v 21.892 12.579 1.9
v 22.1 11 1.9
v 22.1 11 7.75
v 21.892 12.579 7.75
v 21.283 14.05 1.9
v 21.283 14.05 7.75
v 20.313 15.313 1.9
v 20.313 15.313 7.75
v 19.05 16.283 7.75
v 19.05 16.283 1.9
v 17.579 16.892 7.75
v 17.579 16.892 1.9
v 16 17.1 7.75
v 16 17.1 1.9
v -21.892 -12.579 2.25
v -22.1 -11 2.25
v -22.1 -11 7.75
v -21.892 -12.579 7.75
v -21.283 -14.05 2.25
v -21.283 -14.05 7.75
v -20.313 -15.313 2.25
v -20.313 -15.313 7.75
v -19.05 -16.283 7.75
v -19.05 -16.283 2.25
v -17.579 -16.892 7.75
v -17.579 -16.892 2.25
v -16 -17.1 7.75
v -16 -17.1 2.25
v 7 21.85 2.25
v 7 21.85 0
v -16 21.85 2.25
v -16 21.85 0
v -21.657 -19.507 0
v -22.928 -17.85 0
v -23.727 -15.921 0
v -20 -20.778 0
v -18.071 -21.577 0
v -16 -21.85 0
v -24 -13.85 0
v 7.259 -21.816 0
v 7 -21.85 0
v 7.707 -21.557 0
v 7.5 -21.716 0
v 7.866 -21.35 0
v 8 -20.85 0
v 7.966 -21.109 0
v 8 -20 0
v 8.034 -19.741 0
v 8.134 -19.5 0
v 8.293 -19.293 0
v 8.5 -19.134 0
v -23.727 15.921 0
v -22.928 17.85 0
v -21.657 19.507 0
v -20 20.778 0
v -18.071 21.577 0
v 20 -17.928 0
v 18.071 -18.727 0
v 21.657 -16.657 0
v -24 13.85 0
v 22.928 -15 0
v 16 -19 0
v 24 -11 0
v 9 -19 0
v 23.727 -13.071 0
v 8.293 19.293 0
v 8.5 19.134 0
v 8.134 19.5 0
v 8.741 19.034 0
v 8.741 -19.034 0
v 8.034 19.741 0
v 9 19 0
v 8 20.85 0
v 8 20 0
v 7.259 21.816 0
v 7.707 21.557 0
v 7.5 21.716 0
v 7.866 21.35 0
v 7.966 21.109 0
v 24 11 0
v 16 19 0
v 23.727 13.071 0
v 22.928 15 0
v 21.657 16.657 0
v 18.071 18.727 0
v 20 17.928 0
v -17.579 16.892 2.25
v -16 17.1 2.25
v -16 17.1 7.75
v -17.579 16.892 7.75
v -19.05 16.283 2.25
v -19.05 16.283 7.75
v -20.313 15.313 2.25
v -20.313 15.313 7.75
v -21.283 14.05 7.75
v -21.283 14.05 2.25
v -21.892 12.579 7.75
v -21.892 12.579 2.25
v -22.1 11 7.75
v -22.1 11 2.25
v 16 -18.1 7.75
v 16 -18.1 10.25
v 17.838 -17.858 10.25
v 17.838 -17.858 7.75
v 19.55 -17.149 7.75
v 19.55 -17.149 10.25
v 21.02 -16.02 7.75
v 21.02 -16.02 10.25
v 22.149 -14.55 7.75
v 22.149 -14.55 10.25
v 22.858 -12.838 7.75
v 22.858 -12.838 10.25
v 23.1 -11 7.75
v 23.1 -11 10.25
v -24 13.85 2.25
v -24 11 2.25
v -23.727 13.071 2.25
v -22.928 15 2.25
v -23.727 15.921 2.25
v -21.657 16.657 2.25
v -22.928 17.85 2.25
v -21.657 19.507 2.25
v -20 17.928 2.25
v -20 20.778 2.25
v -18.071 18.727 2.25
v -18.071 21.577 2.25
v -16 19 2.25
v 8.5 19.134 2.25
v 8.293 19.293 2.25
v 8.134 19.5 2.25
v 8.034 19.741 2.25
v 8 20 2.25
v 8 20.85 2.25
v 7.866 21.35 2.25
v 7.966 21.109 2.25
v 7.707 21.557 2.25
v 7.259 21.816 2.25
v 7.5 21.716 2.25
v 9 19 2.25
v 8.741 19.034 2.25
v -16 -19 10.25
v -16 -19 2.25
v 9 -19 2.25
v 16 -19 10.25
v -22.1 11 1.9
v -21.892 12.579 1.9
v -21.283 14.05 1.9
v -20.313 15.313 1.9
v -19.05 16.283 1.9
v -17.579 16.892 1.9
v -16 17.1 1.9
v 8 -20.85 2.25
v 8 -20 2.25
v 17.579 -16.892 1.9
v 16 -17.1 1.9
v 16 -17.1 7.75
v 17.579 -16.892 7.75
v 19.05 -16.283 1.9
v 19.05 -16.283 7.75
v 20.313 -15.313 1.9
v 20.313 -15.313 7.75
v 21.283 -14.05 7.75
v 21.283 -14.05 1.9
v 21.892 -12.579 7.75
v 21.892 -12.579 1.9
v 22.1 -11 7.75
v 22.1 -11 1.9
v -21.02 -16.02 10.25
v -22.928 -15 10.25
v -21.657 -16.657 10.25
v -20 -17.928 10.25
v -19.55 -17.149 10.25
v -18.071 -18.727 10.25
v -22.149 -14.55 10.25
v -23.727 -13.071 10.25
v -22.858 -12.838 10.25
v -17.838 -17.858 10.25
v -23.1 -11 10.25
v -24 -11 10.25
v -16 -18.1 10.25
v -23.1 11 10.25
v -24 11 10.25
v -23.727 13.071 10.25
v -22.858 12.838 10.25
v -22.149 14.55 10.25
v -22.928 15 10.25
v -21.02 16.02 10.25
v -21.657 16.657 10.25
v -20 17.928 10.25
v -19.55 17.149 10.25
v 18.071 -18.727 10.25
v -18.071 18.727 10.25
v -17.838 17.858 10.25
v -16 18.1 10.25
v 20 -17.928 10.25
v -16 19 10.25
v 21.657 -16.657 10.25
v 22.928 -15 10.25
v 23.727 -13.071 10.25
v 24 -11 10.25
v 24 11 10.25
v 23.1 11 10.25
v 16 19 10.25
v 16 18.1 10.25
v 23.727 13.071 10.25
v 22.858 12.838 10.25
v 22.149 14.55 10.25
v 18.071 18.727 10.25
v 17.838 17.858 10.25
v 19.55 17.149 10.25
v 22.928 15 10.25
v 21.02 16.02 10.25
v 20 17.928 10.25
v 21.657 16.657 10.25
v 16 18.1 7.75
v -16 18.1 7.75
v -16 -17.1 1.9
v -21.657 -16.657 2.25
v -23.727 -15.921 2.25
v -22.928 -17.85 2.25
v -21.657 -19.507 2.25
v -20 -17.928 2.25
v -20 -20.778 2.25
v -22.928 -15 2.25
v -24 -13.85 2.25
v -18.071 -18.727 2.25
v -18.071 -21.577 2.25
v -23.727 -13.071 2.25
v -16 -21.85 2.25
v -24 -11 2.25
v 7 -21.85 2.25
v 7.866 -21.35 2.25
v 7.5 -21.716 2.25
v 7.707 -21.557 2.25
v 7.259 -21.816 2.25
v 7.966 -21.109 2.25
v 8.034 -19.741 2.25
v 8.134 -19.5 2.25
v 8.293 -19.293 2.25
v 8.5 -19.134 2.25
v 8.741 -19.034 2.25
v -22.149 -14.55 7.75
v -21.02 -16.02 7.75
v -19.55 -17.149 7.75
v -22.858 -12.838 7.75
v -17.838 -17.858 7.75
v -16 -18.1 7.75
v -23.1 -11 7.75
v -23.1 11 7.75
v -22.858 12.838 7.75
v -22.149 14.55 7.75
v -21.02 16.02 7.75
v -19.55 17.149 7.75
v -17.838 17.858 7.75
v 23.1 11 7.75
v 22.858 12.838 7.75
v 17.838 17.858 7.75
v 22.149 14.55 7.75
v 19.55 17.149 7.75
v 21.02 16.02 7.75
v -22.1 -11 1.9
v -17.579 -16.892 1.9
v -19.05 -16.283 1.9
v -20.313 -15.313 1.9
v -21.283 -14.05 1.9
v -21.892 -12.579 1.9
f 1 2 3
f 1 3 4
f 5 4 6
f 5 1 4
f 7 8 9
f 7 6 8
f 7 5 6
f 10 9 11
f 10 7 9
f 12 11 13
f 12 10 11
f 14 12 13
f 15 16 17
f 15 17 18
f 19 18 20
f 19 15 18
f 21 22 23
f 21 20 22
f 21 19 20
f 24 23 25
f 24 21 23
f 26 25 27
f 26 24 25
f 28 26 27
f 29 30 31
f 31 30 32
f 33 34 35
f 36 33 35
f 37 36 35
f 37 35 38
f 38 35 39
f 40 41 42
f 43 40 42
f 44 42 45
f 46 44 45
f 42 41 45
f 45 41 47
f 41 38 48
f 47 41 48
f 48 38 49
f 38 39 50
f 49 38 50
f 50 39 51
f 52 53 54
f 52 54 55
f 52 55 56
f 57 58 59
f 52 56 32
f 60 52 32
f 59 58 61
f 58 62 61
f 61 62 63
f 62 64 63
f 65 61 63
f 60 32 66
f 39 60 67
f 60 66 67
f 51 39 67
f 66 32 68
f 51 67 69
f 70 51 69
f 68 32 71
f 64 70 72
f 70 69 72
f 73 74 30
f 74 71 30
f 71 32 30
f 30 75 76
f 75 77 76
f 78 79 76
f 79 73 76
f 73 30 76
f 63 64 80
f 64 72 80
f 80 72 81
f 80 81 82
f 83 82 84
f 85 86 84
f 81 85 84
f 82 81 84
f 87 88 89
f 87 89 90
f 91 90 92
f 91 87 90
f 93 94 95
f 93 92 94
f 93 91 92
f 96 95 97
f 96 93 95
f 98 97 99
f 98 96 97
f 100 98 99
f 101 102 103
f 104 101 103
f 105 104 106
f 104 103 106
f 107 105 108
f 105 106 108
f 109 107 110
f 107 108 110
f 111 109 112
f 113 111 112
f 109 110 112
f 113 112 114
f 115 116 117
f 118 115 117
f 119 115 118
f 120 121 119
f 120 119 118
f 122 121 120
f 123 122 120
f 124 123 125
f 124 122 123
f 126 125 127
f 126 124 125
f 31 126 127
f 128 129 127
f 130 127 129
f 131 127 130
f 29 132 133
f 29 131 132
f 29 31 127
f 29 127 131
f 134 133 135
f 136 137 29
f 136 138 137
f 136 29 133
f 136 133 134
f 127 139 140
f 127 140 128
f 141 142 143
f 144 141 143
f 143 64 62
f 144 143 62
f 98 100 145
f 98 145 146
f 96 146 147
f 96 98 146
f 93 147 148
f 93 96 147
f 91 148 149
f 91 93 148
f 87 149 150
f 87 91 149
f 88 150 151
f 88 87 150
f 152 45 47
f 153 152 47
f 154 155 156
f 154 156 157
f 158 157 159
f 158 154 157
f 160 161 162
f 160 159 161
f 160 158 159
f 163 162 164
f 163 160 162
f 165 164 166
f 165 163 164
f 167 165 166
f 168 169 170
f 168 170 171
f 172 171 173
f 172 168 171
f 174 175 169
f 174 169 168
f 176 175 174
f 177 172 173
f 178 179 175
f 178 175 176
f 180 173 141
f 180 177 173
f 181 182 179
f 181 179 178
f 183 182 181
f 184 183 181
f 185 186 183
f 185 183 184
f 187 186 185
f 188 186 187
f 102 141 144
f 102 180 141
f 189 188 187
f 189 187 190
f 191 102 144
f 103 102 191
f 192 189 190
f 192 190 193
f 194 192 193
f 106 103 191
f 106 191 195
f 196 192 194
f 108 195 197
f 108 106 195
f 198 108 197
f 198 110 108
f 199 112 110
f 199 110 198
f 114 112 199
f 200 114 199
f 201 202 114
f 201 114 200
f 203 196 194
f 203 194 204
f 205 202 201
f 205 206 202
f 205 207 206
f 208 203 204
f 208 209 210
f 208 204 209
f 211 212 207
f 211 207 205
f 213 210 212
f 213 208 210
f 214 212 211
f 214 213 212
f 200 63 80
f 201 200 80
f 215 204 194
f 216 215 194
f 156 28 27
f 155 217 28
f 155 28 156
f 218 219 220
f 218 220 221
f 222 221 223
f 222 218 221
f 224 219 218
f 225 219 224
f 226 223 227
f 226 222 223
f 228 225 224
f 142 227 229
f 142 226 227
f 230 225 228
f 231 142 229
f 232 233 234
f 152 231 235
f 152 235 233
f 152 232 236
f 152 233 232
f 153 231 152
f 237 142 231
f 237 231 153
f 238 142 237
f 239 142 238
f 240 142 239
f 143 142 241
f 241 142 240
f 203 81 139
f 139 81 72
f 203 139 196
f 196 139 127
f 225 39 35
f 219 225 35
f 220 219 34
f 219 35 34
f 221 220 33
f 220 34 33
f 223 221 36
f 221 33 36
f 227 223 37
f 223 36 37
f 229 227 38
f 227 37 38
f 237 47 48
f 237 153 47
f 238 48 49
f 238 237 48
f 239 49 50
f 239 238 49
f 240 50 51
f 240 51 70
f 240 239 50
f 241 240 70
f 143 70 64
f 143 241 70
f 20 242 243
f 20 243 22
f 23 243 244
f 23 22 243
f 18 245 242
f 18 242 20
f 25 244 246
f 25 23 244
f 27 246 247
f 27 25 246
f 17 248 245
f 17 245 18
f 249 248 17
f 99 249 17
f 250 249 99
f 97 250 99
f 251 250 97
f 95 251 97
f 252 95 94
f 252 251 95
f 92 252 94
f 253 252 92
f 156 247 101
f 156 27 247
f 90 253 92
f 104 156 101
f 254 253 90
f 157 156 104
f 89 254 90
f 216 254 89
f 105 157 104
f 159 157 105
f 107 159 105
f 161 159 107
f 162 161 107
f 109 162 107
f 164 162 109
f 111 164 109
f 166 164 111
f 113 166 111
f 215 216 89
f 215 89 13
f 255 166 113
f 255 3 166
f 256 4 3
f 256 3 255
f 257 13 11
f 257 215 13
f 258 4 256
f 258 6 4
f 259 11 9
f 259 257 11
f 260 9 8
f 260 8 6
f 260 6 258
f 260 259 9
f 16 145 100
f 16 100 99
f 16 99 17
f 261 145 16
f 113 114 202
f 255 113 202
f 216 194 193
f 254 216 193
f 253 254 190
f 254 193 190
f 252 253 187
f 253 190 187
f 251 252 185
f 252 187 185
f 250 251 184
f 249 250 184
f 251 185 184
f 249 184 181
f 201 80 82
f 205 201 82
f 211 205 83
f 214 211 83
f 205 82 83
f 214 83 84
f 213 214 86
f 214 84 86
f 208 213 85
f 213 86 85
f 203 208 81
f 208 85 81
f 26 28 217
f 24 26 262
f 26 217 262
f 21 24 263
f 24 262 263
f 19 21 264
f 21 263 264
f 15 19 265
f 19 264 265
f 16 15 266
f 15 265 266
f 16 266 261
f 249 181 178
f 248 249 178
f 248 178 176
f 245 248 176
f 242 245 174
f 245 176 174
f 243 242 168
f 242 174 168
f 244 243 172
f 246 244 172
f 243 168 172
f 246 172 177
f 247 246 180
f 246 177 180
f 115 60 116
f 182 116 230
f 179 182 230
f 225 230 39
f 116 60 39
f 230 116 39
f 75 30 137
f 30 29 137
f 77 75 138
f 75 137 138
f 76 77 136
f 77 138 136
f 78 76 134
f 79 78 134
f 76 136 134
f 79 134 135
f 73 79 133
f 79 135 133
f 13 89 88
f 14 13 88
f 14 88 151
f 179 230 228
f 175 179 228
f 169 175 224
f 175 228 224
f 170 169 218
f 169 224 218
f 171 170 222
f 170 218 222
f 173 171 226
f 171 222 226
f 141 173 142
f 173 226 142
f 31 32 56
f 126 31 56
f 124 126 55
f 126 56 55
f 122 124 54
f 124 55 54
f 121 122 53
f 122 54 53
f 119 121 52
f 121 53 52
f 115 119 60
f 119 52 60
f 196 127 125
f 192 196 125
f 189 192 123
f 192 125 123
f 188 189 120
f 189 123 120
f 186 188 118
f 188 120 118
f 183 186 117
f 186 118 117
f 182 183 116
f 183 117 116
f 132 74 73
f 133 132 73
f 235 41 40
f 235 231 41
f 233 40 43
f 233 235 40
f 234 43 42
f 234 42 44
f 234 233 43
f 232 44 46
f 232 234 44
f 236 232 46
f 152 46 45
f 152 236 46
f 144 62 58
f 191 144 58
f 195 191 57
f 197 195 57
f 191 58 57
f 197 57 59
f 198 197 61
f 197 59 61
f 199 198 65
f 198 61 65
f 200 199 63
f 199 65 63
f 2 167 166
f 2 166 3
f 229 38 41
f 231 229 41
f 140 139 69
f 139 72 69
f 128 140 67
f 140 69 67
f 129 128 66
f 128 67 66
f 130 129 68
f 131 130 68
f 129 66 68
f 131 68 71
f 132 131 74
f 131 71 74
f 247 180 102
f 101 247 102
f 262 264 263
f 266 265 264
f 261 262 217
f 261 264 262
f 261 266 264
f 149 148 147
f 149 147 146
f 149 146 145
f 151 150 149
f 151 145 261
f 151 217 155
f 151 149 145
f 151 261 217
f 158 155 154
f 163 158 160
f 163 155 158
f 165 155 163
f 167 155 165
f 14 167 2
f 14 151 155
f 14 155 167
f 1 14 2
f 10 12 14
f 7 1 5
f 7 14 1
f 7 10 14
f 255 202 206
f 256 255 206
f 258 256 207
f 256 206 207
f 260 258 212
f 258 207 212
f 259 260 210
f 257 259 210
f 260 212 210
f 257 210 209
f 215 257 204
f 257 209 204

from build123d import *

# Parameters (mm, degrees)
F1_DEPTH     = 10.25
F3_DEPTH     = 2.25
F4_R         = 1
F5_T         = 1.9
F5_T3_DEPTH  = 4.8
F5_T5_DEPTH  = 27.8
F5_T8_ANGLE  = 90.000000001
F5_T10_ANGLE = 90.000000001
F7_DEPTH     = 2.5


# Not quite as in the source:
# - a shell that OpenCascade refuses in one call is made with other operations: the cavity is built on its own and cut out


with BuildPart() as f1:
    # F0 (on Top) → F1 (new body)
    with BuildSketch(Plane.XY):
        with BuildLine():
            Line((16, 19), (-16, 19))
            ThreePointArc((-16, 19), (-21.6568542495, 16.6568542495), (-24, 11))
            Line((-24, 11), (-24, -11))
            ThreePointArc((-24, -11), (-21.6568542495, -16.6568542495), (-16, -19))
            Line((-16, -19), (16, -19))
            ThreePointArc((16, -19), (21.6568542495, -16.6568542495), (24, -11))
            Line((24, -11), (24, 11))
            ThreePointArc((24, 11), (21.6568542495, 16.6568542495), (16, 19))
        make_face()
    extrude(amount=F1_DEPTH)

    # F2 (on Top) → F3 (join)
    with BuildSketch(Plane.XY):
        with BuildLine():
            Line((8, 21.85), (-16, 21.85))
            ThreePointArc((-16, 21.85), (-21.6568542495, 19.5068542495), (-24, 13.85))
            Line((-24, 13.85), (-24, -13.85))
            ThreePointArc((-24, -13.85), (-21.6568542495, -19.5068542495), (-16, -21.85))
            Line((-16, -21.85), (8, -21.85))
            Line((8, -21.85), (8, 21.85))
        make_face()
    extrude(amount=F3_DEPTH)

    # F4
    f4_edges = [f1.edges().sort_by_distance(p)[0] for p in [
        (8, 21.85, 1.125),
        (8, 19, 1.125),
        (8, -19, 1.125),
        (8, -21.85, 1.125),
    ]]
    fillet(f4_edges, radius=F4_R)

    # F5: shell of thickness 1.9, made by hand


with BuildPart() as f5_core1:
    # F5_t2: copy of F1
    add(f1.part)

    # the walls: a layer under each face that stays
    f5_faces = [f5_core1.faces().sort_by_distance(p)[0] for p in [
        (0, 19, 5.125),
        (0, 0, 0),
        (8.2928932188, 19.2928932188, 1.125),
        (21.6568542495, 16.6568542495, 5.125),
        (-18.5, 20.0416666667, 2.25),
        (-21.6568542495, 16.6568542495, 6.25),
        (8, 20.425, 1.125),
        (24, 0, 5.125),
        (21.6568542495, -16.6568542495, 5.125),
        (-4.5, 21.85, 1.125),
        (0, -19, 5.125),
        (-21.6568542495, 19.5068542495, 1.125),
        (8.2928932188, -19.2928932188, 1.125),
        (-24, 0, 5.125),
        (8, -20.425, 1.125),
        (-21.6568542495, -19.5068542495, 1.125),
        (-4.5, -21.85, 1.125),
        (-21.6568542495, -16.6568542495, 6.25),
        (-18.5, -20.0416666667, 2.25),
    ]]
    thicken(f5_faces, amount=-F5_T, mode=Mode.SUBTRACT)

    # F5_s4 → F5_t3 (cut)
    with BuildSketch(Plane.YZ.offset(6.1)):
        Polygon((19.019, 2.269), (17.1, 2.25), (17.1, 0.35), (19, 0.35), align=None)
        Polygon((-19.019, 2.269), (-17.1, 2.25), (-17.1, 0.35), (-19, 0.35), align=None)
    extrude(amount=F5_T3_DEPTH, mode=Mode.SUBTRACT)

    # F5_s6 → F5_t5 (cut)
    with BuildSketch(Plane.YZ.offset(-17.9)):
        Polygon((19.019, 2.269), (17.1, 2.25), (17.1, 0.35), (19, 0.35), align=None)
        Polygon((-19.019, 2.269), (-17.1, 2.25), (-17.1, 0.35), (-19, 0.35), align=None)
    extrude(amount=F5_T5_DEPTH, mode=Mode.SUBTRACT)

    # F5_s7 → F5_t8 (revolve, cut)
    with BuildSketch(Plane.XZ.offset(-11)):
        Polygon((-24.019, 2.269), (-24, 0.35), (-22.1, 0.35), (-22.1, 2.25), align=None)
    revolve(axis=Axis((-16, 11, 2.25), (0, 0, -1)), revolution_arc=F5_T8_ANGLE, mode=Mode.SUBTRACT)

    # F5_s9 → F5_t10 (revolve, cut)
    with BuildSketch(Plane.YZ.offset(-16)):
        Polygon((-19.019, 2.269), (-17.1, 2.25), (-17.1, 0.35), (-19, 0.35), align=None)
    revolve(axis=Axis((-16, -11, 2.25), (0, 0, -1)), revolution_arc=F5_T10_ANGLE, mode=Mode.SUBTRACT)


with BuildPart() as f1_1:
    add(f1.part)

    # what is left inside the walls is the cavity
    f5_cavity = [f5_core1.part.solids().sort_by_distance(p)[0] for p in [
        (0, -5.7, 10.231),
    ]]
    add(f5_cavity, mode=Mode.SUBTRACT)

    # F6 (on face) → F7 (cut)
    with BuildSketch(Plane.XY.offset(10.25)):
        with BuildLine():
            Line((23.1, -11), (23.1, 11))
            ThreePointArc((23.1, 11), (21.0204581464, 16.0204581464), (16, 18.1))
            Line((16, 18.1), (-16, 18.1))
            ThreePointArc((-16, 18.1), (-21.0204581464, 16.0204581464), (-23.1, 11))
            Line((-23.1, 11), (-23.1, -11))
            ThreePointArc((-23.1, -11), (-21.0204581464, -16.0204581464), (-16, -18.1))
            Line((-16, -18.1), (16, -18.1))
            ThreePointArc((16, -18.1), (21.0204581464, -16.0204581464), (23.1, -11))
        make_face()
        with BuildLine():
            Line((-22.1, -11), (-22.1, 11))
            ThreePointArc((-22.1, 11), (-20.3133513652, 15.3133513652), (-16, 17.1))
            Line((-16, 17.1), (16, 17.1))
            ThreePointArc((16, 17.1), (20.3133513652, 15.3133513652), (22.1, 11))
            Line((22.1, 11), (22.1, -11))
            ThreePointArc((22.1, -11), (20.3133513652, -15.3133513652), (16, -17.1))
            Line((16, -17.1), (-16, -17.1))
            ThreePointArc((-16, -17.1), (-20.3133513652, -15.3133513652), (-22.1, -11))
        make_face(mode=Mode.SUBTRACT)
    extrude(amount=-F7_DEPTH, mode=Mode.SUBTRACT)


solid = f1_1.part
